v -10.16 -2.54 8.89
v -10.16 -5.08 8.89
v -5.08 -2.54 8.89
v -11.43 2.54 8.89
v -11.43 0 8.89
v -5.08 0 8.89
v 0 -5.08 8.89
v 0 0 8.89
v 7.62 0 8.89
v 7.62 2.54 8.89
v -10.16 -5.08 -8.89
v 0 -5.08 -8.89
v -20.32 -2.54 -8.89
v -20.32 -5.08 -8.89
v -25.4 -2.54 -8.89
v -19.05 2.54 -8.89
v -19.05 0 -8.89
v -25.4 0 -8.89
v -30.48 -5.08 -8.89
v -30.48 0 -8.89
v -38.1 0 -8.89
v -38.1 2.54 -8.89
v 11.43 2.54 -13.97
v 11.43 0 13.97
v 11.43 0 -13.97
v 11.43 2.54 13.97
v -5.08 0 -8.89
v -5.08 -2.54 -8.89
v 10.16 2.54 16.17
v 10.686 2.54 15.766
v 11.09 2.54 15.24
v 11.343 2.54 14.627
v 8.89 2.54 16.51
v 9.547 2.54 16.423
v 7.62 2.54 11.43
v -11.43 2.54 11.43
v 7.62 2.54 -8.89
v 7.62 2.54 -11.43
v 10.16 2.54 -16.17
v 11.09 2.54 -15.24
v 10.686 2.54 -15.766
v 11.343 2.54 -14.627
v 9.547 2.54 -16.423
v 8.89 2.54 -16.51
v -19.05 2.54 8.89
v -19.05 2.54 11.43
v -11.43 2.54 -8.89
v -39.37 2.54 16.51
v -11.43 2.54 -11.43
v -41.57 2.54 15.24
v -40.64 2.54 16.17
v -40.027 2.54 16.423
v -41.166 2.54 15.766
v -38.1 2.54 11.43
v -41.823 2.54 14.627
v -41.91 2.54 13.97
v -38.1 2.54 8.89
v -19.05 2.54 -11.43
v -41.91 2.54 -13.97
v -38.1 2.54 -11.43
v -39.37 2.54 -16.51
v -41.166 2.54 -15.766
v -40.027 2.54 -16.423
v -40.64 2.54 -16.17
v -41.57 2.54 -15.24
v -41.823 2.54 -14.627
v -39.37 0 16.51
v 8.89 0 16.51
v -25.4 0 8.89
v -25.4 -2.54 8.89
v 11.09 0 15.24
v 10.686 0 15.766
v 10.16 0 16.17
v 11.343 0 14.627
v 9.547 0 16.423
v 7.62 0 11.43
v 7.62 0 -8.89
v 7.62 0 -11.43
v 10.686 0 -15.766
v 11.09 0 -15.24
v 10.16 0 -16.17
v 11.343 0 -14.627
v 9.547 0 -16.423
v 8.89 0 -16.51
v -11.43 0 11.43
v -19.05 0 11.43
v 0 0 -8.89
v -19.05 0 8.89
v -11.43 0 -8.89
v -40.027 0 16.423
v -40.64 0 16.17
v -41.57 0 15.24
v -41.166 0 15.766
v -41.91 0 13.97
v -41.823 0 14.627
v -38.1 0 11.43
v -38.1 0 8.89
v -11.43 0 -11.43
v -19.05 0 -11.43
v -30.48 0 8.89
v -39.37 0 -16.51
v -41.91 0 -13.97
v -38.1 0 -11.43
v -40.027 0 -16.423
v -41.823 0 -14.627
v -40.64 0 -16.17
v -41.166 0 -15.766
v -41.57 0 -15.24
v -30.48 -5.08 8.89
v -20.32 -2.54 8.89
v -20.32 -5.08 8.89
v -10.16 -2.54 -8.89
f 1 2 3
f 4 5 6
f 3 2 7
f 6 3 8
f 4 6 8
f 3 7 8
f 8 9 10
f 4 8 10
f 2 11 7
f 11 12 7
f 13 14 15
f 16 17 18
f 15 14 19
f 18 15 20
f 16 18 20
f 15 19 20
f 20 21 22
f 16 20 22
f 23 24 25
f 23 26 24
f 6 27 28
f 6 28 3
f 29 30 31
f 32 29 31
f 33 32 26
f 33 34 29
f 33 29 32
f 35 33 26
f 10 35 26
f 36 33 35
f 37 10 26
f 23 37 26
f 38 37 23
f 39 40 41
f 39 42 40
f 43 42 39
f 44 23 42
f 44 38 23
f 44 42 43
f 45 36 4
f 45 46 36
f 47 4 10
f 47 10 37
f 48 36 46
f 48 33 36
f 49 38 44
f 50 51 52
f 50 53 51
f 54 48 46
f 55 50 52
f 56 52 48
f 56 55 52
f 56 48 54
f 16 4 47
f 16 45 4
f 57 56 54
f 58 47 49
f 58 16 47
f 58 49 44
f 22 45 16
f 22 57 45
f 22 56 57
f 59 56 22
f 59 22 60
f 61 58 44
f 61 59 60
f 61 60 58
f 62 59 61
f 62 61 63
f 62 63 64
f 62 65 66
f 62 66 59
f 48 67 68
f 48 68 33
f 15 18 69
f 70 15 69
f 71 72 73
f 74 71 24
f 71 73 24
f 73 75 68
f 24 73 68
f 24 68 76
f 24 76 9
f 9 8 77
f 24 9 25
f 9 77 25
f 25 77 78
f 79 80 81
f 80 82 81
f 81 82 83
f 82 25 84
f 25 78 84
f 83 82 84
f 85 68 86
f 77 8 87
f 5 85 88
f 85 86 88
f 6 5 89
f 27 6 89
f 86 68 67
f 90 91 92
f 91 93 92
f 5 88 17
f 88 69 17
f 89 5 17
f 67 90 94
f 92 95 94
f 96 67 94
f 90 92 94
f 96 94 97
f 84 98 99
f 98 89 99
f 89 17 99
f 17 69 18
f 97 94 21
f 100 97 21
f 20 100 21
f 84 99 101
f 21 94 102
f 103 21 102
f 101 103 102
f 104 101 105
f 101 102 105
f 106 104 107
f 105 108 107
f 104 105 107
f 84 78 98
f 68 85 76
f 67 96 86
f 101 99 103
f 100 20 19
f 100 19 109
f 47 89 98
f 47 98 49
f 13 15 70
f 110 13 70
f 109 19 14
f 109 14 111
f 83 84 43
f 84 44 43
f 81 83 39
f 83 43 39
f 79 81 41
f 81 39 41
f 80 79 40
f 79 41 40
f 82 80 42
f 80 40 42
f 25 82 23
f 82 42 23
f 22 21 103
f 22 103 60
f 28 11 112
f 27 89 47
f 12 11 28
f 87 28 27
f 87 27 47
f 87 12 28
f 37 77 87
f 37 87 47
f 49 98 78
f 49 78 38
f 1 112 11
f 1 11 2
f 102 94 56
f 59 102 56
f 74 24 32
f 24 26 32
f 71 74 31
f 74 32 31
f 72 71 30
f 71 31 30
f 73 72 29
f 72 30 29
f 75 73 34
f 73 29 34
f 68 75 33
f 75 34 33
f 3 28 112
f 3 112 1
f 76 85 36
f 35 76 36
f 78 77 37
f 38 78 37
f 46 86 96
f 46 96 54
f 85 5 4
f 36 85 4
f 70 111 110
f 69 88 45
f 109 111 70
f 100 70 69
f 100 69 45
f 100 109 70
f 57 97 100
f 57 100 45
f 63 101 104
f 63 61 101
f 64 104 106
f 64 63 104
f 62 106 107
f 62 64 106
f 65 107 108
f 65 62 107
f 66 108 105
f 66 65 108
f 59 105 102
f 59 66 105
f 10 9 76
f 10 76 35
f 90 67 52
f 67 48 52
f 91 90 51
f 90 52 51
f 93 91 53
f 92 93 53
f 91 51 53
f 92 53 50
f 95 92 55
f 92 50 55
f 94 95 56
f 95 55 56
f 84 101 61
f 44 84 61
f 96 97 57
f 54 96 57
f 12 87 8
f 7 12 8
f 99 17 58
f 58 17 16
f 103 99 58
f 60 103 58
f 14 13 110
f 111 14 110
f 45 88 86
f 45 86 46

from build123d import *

# Parameters (mm, degrees)
SKETCH1_W               = 17.78
SKETCH1_H               = 2.54
BOSS_EXTRUDE1_DEPTH     = 11.43
SKETCH2_W               = 17.78
SKETCH2_H               = 2.54
BOSS_EXTRUDE2_DEPTH     = 15.24
SKETCH16_W              = 3.81
SKETCH16_H              = 2.54
BOSS_EXTRUDE10_DEPTH    = 7.62
BOSS_EXTRUDE11_REACH    = 36.757
SKETCH17_W              = 5.08
SKETCH17_H              = 2.54
MIRROR3_COPY_1_SKETCH_W = 3.81
MIRROR3_COPY_1_SKETCH_H = 2.54
MIRROR3_COPY_1_DEPTH    = 7.62
MIRROR3_COPY_2_REACH    = 36.757
MIRROR3_COPY_2_SKETCH_W = 5.08
MIRROR3_COPY_2_SKETCH_H = 2.54
SKETCH18_W              = 5.08
SKETCH18_H              = 17.78
BOSS_EXTRUDE12_DEPTH    = 5.08
SKETCH19_W              = 17.78
SKETCH19_H              = 2.54
BOSS_EXTRUDE13_DEPTH    = 5.08
FILLET1_R               = 2.54


with BuildPart() as part:
    # Sketch1 → Boss-Extrude1 (new body)
    with BuildSketch(Plane(origin=(0, 0, 0), x_dir=(0, 0, -1), z_dir=(1, 0, 0))):
        with Locations((0, 1.27)):
            Rectangle(SKETCH1_W, SKETCH1_H)
    extrude(amount=BOSS_EXTRUDE1_DEPTH)

    # Sketch2 → Boss-Extrude2 (add)
    with BuildSketch(Plane.ZY):
        with Locations((0, 1.27)):
            Rectangle(SKETCH2_W, SKETCH2_H)
    extrude(amount=BOSS_EXTRUDE2_DEPTH)

    # Mirror1: part across plane


with BuildPart() as part_1:
    add(part.part)
    add(part.part.mirror(Plane.ZY.offset(15.24)))

    # Sketch16 → Boss-Extrude10 (add)
    with BuildSketch(Plane.XY.offset(8.89)):
        with Locations((-17.145, 1.27)):
            Rectangle(SKETCH16_W, SKETCH16_H)
        with Locations((-40.005, 1.27)):
            Rectangle(SKETCH16_W, SKETCH16_H)
    boss_extrude10 = extrude(amount=BOSS_EXTRUDE10_DEPTH)

    # Sketch17 → Boss-Extrude11 (add, up to next)
    with BuildSketch(Plane.ZY.offset(19.05), mode=Mode.PRIVATE) as boss_extrude11_sk1:
        with Locations((13.97, 1.27)):
            Rectangle(SKETCH17_W, SKETCH17_H)
    boss_extrude11_tool1 = extrude(boss_extrude11_sk1.sketch, amount=BOSS_EXTRUDE11_REACH, mode=Mode.PRIVATE) - part_1.part
    boss_extrude11 = boss_extrude11_tool1.solids().sort_by_distance((-19.05, 1.27, 13.97))[0]
    add(boss_extrude11)

    # Mirror2: Boss-Extrude10, Boss-Extrude11 across plane
    add(boss_extrude10.mirror(Plane.ZY.offset(15.24)))
    add(boss_extrude11.mirror(Plane.ZY.offset(15.24)))

    # Mirror3: Boss-Extrude10, Boss-Extrude11 across plane
    add(boss_extrude10.mirror(Plane.XY))
    add(boss_extrude11.mirror(Plane.XY))

    # Mirror3 copy 1 sketch → Mirror3 copy 1 (add)
    with BuildSketch(Plane(origin=(-30.48, 0, -8.89), x_dir=(-1, 0, 0), z_dir=(0, 0, -1))):
        with Locations((-17.145, 1.27)):
            Rectangle(MIRROR3_COPY_1_SKETCH_W, MIRROR3_COPY_1_SKETCH_H)
        with Locations((-40.005, 1.27)):
            Rectangle(MIRROR3_COPY_1_SKETCH_W, MIRROR3_COPY_1_SKETCH_H)
    extrude(amount=MIRROR3_COPY_1_DEPTH)

    # Mirror3 copy 2 sketch → Mirror3 copy 2 (add, up to next)
    with BuildSketch(Plane(origin=(-11.43, 0, 0), x_dir=(0, 0, -1), z_dir=(1, 0, 0)), mode=Mode.PRIVATE) as mirror3_copy_2_sk1:
        with Locations((13.97, 1.27)):
            Rectangle(MIRROR3_COPY_2_SKETCH_W, MIRROR3_COPY_2_SKETCH_H)
    mirror3_copy_2_tool1 = extrude(mirror3_copy_2_sk1.sketch, amount=MIRROR3_COPY_2_REACH, mode=Mode.PRIVATE) - part_1.part
    add(mirror3_copy_2_tool1.solids().sort_by_distance((-11.43, 1.27, -13.97))[0])

    # Sketch18 → Boss-Extrude12 (add)
    with BuildSketch(Plane.XZ):
        with Locations((-2.54, 0)):
            Rectangle(SKETCH18_W, SKETCH18_H)
    boss_extrude12 = extrude(amount=BOSS_EXTRUDE12_DEPTH)

    # Sketch19 → Boss-Extrude13 (add)
    with BuildSketch(Plane.ZY.offset(5.08)):
        with Locations((0, -3.81)):
            Rectangle(SKETCH19_W, SKETCH19_H)
    boss_extrude13 = extrude(amount=BOSS_EXTRUDE13_DEPTH)

    # Mirror4: Boss-Extrude12, Boss-Extrude13 across plane
    add(boss_extrude12.mirror(Plane.ZY.offset(15.24)))
    add(boss_extrude13.mirror(Plane.ZY.offset(15.24)))

    # Fillet1
    fillet1_edges = [part_1.edges().sort_by_distance(p)[0] for p in [
        (-41.91, 1.27, -16.51),
        (11.43, 1.27, -16.51),
        (-41.91, 1.27, 16.51),
        (11.43, 1.27, 16.51),
    ]]
    fillet(fillet1_edges, radius=FILLET1_R)


solid = part_1.part
